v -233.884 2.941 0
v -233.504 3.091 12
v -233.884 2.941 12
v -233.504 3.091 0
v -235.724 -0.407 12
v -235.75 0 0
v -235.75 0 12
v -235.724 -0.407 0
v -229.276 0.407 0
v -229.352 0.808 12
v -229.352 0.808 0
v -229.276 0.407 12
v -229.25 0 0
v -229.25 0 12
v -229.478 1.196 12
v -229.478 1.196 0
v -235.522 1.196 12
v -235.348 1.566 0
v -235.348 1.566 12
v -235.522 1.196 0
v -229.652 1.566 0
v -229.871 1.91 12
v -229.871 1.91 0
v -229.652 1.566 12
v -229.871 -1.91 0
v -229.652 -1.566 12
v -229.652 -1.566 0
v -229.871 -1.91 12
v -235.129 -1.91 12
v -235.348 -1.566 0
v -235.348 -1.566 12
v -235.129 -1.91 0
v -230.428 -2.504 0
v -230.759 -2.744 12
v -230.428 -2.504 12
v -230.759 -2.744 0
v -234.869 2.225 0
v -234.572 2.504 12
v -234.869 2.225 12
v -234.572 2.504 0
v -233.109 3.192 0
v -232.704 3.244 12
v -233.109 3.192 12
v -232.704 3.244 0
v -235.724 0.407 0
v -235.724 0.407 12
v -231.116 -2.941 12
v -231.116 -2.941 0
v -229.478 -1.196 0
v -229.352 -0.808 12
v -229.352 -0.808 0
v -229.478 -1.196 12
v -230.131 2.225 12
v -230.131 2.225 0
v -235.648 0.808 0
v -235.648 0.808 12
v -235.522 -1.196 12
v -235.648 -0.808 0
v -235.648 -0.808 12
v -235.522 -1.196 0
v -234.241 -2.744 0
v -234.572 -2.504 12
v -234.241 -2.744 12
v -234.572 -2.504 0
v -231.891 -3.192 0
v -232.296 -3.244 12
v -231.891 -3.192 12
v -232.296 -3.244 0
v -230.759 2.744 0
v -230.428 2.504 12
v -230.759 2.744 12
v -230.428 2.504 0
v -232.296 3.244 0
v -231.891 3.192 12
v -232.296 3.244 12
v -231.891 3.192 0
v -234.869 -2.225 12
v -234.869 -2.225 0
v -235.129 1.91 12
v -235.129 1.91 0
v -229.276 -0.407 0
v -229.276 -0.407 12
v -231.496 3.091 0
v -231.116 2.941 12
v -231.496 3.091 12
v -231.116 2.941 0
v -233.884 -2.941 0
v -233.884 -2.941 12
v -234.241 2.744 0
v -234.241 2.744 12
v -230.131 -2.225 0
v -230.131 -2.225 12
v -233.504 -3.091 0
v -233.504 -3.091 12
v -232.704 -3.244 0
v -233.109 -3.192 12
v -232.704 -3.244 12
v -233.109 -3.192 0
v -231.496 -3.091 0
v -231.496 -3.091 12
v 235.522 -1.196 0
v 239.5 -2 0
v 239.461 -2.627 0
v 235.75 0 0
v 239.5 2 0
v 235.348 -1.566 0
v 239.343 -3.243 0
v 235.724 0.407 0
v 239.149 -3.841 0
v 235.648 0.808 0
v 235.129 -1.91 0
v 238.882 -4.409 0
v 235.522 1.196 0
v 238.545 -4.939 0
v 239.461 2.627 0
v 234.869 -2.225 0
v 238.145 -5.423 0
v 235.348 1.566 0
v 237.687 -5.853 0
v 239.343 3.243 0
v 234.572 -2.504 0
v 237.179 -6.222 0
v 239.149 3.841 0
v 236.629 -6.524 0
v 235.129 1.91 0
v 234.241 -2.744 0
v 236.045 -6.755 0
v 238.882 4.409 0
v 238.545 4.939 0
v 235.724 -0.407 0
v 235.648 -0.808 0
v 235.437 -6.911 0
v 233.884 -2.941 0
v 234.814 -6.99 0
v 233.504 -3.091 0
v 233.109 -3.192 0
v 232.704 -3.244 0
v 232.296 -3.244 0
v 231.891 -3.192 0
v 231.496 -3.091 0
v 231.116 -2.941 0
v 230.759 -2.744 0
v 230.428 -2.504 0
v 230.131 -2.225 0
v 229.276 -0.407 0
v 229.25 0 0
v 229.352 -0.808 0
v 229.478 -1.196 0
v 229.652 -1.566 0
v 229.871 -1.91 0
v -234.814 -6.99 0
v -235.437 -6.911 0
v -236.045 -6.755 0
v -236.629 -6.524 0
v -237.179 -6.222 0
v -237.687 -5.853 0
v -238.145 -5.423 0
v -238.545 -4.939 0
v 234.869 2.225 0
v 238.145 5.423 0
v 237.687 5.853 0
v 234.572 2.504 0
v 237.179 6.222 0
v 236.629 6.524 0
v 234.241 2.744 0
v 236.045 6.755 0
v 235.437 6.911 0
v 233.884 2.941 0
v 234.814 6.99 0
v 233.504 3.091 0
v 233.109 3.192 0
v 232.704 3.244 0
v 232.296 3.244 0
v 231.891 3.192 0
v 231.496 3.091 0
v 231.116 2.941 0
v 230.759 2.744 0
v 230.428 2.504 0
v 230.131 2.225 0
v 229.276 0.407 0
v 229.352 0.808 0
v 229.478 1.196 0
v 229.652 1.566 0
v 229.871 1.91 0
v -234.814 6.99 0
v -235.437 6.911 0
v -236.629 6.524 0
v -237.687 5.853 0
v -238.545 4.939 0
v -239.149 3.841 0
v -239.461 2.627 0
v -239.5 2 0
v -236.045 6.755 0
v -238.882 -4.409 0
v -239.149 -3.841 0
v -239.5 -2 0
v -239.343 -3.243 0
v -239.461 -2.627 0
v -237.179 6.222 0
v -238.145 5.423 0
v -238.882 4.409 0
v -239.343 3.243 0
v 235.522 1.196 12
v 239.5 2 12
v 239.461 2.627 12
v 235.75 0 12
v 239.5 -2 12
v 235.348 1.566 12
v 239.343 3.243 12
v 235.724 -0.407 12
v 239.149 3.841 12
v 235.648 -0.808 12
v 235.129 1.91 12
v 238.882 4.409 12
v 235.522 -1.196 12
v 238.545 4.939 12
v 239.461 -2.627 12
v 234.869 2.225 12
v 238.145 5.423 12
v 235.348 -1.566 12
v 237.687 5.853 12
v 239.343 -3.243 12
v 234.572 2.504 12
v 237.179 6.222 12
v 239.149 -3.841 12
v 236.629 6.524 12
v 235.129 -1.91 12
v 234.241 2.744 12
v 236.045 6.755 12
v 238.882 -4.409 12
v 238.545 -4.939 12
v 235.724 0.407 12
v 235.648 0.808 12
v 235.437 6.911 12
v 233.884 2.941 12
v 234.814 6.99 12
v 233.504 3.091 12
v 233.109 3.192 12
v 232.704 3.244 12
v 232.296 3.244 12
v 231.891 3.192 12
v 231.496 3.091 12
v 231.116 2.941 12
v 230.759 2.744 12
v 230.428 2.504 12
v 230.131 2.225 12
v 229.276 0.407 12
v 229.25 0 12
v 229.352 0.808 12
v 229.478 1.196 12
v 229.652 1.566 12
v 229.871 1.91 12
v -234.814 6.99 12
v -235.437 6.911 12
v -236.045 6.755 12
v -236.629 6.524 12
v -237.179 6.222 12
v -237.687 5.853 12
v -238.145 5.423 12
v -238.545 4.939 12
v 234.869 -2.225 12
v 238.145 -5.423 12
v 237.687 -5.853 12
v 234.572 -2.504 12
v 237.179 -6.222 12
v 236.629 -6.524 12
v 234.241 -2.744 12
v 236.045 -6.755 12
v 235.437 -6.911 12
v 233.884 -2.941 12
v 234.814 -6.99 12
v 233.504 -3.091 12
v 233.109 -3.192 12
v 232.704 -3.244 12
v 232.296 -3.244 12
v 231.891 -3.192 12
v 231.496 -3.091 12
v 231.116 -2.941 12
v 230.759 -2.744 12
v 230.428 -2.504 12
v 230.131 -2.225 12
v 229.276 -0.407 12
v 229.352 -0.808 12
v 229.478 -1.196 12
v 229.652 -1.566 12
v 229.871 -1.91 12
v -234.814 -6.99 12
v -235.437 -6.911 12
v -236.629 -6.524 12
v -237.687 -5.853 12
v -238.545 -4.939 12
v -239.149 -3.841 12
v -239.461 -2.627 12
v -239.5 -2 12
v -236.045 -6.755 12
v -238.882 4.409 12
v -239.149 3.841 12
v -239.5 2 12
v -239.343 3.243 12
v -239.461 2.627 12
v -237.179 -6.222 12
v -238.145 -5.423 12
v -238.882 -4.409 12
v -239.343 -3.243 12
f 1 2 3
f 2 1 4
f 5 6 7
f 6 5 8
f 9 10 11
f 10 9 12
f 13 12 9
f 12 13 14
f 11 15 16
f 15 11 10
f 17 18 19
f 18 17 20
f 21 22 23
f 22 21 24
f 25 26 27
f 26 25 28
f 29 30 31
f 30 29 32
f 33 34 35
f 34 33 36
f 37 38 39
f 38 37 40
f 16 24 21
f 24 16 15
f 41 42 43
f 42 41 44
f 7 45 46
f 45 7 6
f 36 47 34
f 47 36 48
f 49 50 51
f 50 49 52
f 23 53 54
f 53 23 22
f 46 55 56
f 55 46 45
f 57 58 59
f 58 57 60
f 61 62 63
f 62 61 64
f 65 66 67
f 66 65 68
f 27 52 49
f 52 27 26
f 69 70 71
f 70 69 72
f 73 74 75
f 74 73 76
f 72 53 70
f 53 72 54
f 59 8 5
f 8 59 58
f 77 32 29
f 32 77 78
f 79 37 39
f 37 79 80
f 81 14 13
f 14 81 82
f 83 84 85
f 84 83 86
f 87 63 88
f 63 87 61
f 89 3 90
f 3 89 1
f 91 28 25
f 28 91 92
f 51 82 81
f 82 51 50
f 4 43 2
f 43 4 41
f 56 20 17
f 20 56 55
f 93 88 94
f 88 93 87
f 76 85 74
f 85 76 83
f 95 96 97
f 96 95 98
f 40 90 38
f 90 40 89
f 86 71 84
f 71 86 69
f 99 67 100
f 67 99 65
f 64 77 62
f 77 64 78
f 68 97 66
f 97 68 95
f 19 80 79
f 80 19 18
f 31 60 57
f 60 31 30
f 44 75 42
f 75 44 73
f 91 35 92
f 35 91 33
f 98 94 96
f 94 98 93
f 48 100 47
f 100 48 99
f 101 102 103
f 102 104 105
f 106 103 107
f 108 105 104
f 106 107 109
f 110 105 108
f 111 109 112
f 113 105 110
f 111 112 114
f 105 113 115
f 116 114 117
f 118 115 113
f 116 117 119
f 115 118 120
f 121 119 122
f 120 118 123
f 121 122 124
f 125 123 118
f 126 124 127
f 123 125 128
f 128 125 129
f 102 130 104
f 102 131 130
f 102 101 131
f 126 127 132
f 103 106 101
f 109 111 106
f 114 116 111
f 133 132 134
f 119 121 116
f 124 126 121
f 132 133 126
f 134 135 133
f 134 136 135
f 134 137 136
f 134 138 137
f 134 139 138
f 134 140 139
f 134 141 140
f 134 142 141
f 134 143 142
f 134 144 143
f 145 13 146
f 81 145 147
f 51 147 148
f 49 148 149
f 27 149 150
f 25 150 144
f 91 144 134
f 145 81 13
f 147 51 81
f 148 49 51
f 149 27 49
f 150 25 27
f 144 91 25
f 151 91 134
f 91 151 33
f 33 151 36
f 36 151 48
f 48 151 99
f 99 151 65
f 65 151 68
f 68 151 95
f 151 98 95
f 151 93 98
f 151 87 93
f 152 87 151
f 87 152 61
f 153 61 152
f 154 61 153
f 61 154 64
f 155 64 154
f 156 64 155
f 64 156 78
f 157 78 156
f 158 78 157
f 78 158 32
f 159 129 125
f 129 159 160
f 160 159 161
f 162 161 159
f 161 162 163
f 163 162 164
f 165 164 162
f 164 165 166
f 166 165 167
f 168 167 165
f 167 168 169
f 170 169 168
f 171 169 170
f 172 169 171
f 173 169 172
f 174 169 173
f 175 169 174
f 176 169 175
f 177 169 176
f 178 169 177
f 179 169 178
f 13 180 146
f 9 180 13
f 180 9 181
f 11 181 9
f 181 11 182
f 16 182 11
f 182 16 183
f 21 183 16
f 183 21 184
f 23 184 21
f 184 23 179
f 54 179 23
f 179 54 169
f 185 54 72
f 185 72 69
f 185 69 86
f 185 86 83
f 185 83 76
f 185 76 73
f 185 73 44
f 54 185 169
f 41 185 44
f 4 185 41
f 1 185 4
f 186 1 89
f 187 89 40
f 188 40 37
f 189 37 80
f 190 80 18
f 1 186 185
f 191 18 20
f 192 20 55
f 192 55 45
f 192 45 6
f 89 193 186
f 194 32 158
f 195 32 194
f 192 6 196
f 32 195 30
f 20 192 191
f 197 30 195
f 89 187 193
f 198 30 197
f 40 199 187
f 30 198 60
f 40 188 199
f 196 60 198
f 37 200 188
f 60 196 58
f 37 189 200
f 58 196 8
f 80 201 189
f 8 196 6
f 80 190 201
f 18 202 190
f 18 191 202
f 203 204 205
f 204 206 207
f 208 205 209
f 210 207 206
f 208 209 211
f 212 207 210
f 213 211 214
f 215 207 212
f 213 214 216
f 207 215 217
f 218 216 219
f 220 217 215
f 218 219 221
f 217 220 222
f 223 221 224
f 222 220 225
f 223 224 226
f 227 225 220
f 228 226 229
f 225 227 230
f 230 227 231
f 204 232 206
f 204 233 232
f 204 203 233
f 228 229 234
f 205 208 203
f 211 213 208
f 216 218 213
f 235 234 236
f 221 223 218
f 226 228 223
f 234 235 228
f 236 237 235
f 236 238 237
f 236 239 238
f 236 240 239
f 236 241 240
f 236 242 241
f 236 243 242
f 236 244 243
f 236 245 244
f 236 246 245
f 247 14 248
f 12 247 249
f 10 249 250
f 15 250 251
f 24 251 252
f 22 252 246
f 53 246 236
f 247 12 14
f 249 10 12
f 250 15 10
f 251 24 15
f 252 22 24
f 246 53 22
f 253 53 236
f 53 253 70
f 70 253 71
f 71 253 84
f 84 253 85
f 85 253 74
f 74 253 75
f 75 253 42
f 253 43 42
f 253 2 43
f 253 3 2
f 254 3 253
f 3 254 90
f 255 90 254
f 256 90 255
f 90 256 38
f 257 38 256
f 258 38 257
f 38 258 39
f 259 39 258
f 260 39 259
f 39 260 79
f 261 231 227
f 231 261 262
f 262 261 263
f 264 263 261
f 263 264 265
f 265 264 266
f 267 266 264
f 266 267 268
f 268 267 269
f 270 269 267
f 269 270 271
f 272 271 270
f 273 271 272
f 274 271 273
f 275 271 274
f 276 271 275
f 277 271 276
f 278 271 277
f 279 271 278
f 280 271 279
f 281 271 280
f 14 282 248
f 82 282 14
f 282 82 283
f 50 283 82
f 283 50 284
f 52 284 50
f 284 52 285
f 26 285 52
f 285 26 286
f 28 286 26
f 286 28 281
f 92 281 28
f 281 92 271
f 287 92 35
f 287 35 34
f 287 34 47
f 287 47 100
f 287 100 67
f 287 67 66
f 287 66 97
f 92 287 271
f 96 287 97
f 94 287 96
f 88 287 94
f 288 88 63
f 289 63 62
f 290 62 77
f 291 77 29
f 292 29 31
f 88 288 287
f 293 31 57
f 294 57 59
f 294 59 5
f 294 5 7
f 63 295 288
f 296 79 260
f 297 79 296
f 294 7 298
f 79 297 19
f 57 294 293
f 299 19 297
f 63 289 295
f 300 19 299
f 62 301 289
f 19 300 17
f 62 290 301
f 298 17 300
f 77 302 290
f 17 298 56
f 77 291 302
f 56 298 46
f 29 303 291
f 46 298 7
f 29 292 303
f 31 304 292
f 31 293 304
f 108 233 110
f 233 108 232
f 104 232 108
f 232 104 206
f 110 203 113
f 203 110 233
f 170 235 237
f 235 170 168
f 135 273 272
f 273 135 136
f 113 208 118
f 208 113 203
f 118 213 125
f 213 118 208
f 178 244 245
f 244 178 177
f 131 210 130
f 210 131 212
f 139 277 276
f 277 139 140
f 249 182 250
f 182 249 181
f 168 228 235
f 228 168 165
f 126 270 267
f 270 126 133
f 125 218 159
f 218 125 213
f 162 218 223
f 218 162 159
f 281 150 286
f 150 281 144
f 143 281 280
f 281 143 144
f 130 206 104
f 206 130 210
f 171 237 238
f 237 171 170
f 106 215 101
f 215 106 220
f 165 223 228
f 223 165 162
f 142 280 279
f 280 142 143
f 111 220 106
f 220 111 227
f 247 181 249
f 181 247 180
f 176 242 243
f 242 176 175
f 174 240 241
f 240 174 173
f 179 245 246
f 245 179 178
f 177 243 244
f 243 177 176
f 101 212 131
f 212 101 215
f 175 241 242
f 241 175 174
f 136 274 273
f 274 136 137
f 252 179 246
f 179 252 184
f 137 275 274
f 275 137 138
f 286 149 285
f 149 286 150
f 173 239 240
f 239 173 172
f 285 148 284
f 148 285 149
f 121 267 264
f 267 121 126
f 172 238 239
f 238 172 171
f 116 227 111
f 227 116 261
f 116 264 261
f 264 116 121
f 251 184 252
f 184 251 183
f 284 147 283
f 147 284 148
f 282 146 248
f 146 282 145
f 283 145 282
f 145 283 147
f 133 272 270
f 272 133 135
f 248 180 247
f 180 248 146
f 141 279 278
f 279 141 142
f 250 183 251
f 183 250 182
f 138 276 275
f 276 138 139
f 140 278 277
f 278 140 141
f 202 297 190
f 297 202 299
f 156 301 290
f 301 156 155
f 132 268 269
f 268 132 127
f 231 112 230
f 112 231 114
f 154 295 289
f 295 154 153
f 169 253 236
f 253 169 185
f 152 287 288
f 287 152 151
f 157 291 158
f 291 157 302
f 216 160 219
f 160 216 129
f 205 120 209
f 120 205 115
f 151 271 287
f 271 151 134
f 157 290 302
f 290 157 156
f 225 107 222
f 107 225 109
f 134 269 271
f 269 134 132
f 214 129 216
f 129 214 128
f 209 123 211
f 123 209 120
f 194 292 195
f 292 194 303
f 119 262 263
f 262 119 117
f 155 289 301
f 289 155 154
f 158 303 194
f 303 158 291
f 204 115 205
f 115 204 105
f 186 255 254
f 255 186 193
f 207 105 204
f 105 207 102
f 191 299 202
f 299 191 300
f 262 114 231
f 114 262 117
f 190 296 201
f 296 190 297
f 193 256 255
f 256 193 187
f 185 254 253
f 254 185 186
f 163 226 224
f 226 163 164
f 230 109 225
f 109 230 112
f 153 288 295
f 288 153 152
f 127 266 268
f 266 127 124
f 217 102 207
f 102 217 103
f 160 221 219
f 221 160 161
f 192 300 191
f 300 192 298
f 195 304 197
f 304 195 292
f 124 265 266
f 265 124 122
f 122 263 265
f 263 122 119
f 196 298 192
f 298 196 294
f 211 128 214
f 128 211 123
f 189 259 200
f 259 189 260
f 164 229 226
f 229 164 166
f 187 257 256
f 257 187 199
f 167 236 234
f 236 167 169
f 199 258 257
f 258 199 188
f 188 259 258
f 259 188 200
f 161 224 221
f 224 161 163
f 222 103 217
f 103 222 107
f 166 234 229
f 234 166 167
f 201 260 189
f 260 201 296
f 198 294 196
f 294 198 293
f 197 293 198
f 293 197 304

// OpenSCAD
$fn = 50;


difference() {
	union() {
		hull() {
			translate(v = [-234.5000000000, 2.0000000000, 0]) {
				cylinder(h = 12, r = 5);
			}
			translate(v = [234.5000000000, 2.0000000000, 0]) {
				cylinder(h = 12, r = 5);
			}
			translate(v = [-234.5000000000, -2.0000000000, 0]) {
				cylinder(h = 12, r = 5);
			}
			translate(v = [234.5000000000, -2.0000000000, 0]) {
				cylinder(h = 12, r = 5);
			}
		}
	}
	union() {
		translate(v = [-232.5000000000, 0.0000000000, 0]) {
			cylinder(h = 12, r = 3.2500000000);
		}
		translate(v = [232.5000000000, 0.0000000000, 0]) {
			cylinder(h = 12, r = 3.2500000000);
		}
		translate(v = [-232.5000000000, 0.0000000000, 0]) {
			cylinder(h = 12, r = 1.8000000000);
		}
		translate(v = [232.5000000000, 0.0000000000, 0]) {
			cylinder(h = 12, r = 1.8000000000);
		}
		translate(v = [-232.5000000000, 0.0000000000, 0]) {
			cylinder(h = 12, r = 1.8000000000);
		}
		translate(v = [232.5000000000, 0.0000000000, 0]) {
			cylinder(h = 12, r = 1.8000000000);
		}
		translate(v = [-232.5000000000, 0.0000000000, 0]) {
			cylinder(h = 12, r = 1.8000000000);
		}
		translate(v = [232.5000000000, 0.0000000000, 0]) {
			cylinder(h = 12, r = 1.8000000000);
		}
	}
}
